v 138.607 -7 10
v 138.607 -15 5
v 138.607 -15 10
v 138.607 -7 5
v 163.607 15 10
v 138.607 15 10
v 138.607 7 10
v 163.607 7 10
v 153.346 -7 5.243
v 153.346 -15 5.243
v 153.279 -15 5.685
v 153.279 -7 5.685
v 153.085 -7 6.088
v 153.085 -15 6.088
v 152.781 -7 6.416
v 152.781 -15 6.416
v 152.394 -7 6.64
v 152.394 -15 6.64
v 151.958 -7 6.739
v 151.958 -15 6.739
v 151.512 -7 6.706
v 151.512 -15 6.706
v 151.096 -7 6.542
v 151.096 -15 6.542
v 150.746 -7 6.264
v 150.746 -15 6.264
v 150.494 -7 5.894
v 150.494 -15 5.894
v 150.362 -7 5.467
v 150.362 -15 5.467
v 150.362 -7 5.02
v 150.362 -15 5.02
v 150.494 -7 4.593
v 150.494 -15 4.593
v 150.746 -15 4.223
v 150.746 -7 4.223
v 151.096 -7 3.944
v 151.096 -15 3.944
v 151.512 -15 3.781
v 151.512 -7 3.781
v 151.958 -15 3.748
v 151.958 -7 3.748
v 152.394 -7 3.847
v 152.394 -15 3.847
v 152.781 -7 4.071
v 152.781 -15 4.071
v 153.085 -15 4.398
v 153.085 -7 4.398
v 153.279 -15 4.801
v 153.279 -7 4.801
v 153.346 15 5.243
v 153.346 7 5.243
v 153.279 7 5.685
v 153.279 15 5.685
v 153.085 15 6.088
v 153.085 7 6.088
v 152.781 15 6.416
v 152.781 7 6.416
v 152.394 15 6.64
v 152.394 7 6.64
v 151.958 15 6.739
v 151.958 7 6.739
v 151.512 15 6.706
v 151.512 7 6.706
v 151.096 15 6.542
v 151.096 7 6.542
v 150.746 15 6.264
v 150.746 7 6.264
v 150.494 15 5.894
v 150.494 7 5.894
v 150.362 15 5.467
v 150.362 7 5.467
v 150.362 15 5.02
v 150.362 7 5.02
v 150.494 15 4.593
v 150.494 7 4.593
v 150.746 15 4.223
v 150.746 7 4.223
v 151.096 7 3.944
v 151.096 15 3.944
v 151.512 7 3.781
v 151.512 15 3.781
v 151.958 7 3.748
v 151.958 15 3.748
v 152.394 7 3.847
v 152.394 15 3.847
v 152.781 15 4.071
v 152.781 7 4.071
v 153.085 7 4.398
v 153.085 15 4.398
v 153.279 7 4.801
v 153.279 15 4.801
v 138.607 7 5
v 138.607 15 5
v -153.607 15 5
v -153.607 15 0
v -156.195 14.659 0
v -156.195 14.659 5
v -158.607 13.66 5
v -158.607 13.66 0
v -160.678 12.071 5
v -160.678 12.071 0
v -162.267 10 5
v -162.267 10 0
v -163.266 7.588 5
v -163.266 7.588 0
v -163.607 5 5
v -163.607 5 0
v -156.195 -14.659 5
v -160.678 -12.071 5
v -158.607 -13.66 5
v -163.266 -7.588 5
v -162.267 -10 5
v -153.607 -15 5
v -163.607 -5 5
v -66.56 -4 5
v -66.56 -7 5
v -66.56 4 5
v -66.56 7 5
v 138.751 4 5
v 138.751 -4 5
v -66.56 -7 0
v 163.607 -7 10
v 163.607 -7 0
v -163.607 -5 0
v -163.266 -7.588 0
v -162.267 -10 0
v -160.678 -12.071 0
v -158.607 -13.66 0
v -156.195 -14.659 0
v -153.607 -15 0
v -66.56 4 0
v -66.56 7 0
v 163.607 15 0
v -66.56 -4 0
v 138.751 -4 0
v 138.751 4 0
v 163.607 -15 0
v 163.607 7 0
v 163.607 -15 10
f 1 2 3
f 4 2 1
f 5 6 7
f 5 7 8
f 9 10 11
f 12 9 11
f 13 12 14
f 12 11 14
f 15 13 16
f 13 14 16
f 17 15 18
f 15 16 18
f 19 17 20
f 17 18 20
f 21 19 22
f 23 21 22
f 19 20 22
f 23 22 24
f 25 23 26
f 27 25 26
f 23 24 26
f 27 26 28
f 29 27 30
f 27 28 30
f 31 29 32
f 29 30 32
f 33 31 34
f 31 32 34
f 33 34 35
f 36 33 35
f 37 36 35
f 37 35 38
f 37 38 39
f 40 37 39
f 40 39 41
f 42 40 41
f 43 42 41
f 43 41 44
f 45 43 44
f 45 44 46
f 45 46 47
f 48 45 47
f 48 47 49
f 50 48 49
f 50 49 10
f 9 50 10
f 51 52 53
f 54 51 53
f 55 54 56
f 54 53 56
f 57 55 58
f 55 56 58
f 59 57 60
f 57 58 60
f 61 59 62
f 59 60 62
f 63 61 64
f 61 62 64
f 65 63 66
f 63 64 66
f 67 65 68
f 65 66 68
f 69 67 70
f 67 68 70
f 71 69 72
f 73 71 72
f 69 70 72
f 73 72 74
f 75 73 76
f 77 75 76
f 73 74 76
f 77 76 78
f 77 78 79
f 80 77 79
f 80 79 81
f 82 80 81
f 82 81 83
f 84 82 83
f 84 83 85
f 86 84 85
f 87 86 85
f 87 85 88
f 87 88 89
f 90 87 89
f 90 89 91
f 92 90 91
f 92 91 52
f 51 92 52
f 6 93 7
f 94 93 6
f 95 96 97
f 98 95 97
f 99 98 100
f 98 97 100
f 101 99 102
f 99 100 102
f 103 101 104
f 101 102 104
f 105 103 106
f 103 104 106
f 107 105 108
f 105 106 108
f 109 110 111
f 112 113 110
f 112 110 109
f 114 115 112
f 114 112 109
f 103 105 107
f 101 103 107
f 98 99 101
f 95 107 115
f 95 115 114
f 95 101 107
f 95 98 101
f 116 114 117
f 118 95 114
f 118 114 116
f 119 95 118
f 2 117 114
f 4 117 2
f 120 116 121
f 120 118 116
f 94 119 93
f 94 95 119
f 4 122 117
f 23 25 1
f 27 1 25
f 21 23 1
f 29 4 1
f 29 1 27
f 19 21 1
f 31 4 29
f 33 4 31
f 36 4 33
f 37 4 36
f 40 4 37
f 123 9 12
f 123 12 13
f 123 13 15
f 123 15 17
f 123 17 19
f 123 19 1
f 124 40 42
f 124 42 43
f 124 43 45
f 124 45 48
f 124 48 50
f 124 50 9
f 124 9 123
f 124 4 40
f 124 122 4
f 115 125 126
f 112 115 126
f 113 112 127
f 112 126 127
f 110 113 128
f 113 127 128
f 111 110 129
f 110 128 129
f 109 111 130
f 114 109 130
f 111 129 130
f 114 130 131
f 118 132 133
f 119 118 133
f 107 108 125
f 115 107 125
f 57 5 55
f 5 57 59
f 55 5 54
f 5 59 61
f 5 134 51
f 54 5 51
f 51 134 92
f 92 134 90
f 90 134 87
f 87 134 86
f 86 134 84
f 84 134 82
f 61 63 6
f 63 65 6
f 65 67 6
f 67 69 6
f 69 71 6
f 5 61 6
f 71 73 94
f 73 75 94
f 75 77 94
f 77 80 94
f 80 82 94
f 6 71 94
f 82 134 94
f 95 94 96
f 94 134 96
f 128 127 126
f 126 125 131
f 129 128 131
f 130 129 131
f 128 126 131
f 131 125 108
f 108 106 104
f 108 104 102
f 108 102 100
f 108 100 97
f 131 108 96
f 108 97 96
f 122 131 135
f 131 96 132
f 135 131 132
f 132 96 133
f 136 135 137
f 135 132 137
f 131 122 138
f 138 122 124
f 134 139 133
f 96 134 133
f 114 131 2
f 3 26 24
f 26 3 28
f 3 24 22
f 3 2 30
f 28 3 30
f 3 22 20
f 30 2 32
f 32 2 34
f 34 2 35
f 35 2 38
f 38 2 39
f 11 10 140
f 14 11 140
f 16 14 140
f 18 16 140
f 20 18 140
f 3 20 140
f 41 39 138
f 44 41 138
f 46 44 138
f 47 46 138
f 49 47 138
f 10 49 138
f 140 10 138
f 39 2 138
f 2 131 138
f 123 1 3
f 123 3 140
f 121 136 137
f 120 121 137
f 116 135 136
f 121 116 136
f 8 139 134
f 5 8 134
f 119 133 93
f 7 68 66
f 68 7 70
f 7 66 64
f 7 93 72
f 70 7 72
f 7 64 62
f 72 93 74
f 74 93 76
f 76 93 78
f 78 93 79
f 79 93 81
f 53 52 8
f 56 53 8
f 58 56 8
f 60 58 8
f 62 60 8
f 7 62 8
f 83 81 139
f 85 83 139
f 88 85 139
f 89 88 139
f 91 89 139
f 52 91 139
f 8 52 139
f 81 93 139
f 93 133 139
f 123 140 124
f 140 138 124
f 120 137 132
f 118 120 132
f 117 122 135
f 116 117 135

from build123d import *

# Parameters (mm, degrees)
F1_DEPTH = 5
F2_W     = 25
F2_H     = 8
F3_DEPTH = 5
F4_R     = 1.5
F5_DEPTH = 30.3


with BuildPart() as f1:
    # F0 (on Top) → F1 (new body)
    with BuildSketch(Plane.XY):
        with BuildLine():
            Line((-153.607063, -15), (163.607063, -15))
            Line((163.607063, -15), (163.607063, -7))
            Line((163.607063, -7), (-66.559589, -7))
            Line((-66.559589, -7), (-66.559589, -4))
            Line((-66.559589, -4), (138.750769, -4))
            Line((138.750769, -4), (138.750769, 4))
            Line((138.750769, 4), (-66.559589, 4))
            Line((-66.559589, 4), (-66.559589, 7))
            Line((-66.559589, 7), (163.607063, 7))
            Line((163.607063, 7), (163.607063, 15))
            Line((163.607063, 15), (-153.607063, 15))
            ThreePointArc((-153.607063, 15), (-160.678131, 12.071068), (-163.607063, 5))
            Line((-163.607063, 5), (-163.607063, -5))
            ThreePointArc((-163.607063, -5), (-160.678131, -12.071068), (-153.607063, -15))
        make_face()
    extrude(amount=F1_DEPTH)

    # F2 (on face) → F3 (join)
    with BuildSketch(Plane.XY.offset(5)):
        with Locations((151.107063, -11)):
            Rectangle(F2_W, F2_H)
        with Locations((151.107063, 11)):
            Rectangle(F2_W, F2_H)
    extrude(amount=F3_DEPTH)

    # F4 (on face) → F5 (cut)
    with BuildSketch(Plane.XZ.offset(15)):
        with Locations((151.84553, 5.24334)):
            Circle(F4_R)
    extrude(amount=-F5_DEPTH, mode=Mode.SUBTRACT)


solid = f1.part
